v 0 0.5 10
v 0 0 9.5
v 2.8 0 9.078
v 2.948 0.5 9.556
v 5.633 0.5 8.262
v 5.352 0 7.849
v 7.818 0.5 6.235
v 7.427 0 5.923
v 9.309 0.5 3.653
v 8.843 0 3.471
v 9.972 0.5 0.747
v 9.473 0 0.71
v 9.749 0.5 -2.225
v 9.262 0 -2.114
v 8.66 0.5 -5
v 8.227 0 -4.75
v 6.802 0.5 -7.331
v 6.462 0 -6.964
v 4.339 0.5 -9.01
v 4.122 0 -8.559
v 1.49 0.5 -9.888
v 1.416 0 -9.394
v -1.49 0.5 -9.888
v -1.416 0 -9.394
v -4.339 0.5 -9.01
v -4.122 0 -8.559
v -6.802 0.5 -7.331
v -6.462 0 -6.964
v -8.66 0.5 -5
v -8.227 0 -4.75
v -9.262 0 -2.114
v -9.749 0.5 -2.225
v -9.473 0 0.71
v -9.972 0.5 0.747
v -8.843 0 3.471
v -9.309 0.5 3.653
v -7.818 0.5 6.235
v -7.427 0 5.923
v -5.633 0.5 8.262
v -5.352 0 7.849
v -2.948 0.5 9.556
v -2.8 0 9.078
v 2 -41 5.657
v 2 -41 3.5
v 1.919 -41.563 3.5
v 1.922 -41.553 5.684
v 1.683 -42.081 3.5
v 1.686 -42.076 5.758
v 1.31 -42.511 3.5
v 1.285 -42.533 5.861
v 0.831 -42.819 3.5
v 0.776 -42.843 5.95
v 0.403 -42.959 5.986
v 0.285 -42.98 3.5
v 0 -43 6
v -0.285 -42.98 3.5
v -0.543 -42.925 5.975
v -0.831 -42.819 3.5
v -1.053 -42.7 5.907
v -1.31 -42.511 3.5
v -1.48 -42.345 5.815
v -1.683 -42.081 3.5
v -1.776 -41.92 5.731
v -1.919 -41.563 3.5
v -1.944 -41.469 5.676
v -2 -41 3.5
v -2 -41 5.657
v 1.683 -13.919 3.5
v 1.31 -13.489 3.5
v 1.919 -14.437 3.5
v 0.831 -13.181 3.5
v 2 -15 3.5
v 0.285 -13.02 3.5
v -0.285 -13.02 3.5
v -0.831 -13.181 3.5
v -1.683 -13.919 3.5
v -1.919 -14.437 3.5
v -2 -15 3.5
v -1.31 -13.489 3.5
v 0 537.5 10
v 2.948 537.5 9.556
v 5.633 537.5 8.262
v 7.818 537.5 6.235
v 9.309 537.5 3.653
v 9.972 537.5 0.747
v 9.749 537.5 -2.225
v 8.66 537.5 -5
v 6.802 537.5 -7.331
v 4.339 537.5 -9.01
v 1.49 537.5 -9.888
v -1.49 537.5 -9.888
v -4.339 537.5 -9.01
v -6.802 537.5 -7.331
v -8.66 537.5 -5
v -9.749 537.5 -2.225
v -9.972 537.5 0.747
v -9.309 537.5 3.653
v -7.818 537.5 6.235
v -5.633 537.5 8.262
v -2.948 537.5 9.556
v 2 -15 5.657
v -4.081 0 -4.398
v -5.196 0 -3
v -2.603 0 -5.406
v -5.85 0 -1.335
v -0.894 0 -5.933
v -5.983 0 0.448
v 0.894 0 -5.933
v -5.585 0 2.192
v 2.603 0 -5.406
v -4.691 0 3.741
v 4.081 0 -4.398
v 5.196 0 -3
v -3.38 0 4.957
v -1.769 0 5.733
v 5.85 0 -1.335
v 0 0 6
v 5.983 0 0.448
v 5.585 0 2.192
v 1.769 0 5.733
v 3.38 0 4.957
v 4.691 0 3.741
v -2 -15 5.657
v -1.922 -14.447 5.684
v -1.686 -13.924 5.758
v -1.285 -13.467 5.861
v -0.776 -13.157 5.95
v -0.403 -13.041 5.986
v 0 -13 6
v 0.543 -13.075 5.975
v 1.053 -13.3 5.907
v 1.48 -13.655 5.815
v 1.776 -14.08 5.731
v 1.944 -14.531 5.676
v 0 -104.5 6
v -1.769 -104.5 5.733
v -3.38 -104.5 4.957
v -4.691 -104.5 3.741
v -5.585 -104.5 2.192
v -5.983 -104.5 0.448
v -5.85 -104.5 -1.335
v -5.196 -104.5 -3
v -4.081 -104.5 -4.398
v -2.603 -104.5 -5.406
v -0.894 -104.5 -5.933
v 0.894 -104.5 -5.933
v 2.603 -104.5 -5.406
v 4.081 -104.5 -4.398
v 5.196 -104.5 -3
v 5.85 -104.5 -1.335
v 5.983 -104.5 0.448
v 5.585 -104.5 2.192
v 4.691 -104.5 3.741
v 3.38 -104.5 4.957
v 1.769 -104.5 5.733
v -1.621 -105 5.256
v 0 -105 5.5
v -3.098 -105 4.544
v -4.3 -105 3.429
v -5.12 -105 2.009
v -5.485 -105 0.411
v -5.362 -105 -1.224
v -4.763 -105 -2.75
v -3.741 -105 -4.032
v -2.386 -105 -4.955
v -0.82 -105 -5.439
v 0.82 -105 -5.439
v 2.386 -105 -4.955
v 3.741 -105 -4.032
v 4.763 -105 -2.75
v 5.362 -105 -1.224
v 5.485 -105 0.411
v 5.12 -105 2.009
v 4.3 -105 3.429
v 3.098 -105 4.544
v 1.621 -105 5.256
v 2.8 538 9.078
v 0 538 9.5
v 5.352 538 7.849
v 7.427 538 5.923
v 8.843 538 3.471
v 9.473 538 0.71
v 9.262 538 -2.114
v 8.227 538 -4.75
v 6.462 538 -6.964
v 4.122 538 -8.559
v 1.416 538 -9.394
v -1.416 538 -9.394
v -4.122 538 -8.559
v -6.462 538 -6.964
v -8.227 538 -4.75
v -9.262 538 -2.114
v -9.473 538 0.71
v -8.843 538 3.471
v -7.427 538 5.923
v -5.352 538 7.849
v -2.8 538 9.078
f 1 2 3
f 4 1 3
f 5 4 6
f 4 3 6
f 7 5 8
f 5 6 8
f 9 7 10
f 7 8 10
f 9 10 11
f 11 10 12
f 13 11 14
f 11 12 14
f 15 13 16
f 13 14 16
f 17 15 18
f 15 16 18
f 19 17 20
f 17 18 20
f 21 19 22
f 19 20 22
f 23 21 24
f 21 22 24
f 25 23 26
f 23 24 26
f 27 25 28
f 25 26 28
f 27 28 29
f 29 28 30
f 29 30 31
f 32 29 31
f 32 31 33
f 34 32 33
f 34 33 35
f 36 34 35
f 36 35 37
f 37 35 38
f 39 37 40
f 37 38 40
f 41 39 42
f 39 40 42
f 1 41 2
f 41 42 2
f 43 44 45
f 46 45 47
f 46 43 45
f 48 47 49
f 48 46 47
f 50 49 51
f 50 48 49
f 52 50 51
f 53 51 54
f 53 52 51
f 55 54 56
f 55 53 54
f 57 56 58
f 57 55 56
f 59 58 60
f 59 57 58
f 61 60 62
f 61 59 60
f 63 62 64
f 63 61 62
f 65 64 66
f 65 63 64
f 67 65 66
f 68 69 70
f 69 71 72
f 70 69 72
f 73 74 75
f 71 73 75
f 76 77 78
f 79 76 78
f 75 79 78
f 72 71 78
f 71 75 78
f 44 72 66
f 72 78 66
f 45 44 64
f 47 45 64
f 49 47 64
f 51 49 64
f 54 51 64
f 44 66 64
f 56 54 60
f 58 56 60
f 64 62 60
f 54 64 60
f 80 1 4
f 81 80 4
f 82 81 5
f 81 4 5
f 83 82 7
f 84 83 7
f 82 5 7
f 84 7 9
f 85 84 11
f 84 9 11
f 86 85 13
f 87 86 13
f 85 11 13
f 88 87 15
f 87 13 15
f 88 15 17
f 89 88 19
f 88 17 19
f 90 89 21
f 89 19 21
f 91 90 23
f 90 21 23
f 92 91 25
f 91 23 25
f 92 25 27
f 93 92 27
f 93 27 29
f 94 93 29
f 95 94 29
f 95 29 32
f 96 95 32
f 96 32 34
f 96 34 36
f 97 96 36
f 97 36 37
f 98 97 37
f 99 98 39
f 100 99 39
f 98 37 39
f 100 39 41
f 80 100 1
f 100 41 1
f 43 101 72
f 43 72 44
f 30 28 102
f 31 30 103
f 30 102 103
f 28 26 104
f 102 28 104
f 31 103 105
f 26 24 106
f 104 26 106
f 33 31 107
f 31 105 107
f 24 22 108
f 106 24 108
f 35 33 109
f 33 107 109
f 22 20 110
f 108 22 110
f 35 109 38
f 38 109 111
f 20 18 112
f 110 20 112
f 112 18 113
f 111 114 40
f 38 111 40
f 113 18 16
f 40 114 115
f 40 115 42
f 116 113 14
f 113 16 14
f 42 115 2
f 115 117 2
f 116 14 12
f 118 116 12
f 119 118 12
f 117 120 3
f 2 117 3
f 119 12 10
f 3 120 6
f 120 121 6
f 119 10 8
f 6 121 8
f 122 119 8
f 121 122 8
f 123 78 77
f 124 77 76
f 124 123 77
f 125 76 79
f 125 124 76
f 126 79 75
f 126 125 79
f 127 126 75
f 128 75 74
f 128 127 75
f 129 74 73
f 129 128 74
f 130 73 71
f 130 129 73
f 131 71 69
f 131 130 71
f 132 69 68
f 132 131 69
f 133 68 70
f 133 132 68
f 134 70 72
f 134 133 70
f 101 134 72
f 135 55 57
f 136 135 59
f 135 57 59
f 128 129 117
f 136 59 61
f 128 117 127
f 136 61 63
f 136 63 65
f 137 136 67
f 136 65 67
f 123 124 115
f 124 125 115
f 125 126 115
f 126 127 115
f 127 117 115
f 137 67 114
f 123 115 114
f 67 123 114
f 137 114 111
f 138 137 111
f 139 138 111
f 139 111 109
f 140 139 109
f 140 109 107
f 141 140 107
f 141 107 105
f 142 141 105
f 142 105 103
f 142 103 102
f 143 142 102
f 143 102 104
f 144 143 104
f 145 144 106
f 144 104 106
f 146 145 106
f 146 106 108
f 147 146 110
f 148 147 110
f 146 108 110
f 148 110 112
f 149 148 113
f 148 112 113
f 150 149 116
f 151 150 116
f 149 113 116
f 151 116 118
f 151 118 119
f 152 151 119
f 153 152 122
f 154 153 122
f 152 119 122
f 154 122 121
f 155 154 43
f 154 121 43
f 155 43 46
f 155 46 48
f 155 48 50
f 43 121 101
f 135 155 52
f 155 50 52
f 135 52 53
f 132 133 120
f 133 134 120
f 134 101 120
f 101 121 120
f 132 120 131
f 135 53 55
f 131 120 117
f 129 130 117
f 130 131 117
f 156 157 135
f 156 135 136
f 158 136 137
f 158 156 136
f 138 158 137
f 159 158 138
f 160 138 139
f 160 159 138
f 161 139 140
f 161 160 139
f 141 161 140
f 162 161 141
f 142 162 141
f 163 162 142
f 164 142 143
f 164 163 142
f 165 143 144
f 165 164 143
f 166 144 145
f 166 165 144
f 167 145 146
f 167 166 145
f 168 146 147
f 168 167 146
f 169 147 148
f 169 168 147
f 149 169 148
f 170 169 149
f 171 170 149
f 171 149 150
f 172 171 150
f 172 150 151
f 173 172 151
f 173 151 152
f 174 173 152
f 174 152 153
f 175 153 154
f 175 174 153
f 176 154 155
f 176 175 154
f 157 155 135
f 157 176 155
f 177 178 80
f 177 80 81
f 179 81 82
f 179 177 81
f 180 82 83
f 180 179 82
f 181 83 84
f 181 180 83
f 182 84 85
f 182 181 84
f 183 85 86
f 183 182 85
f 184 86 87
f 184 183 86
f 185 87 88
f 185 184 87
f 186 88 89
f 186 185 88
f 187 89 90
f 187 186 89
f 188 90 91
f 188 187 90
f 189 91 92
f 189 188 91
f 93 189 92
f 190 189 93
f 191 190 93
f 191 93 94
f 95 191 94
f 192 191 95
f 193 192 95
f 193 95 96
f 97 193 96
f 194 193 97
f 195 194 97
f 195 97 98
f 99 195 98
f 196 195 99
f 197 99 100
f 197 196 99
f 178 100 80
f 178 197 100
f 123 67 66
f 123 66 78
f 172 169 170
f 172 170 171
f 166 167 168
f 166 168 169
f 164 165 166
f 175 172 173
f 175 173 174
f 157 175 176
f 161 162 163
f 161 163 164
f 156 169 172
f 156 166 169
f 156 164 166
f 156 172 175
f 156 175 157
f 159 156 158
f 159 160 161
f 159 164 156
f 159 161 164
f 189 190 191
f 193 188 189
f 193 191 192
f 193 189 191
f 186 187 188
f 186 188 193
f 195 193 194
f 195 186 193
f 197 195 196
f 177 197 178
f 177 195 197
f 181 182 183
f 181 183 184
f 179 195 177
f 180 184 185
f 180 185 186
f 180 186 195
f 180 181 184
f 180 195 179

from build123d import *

# Parameters (mm, degrees)
SKIZZE1_R                       = 10
AUFSATZ_LINEAR_AUSTRAGEN1_DEPTH = 538
SKIZZE2_R                       = 6
AUFSATZ_LINEAR_AUSTRAGEN2_DEPTH = 105
FASE1_SIZE                      = 0.5
CUT_EXTRUDE1_DEPTH              = 2.5


with BuildPart() as part:
    # Skizze1 → Aufsatz-Linear austragen1 (new body)
    with BuildSketch(Plane(origin=(0, 0, 0), x_dir=(1, 0, 0), z_dir=(0, 1, 0))):
        with Locations(Location((0, 0, 0), (0, 0, 270))):  # turned: the seam where the file's is
            Circle(SKIZZE1_R)
    extrude(amount=AUFSATZ_LINEAR_AUSTRAGEN1_DEPTH)

    # Skizze2 → Aufsatz-Linear austragen2 (add)
    with BuildSketch(Plane.XZ):
        with Locations(Location((0, 0, 0), (0, 0, 90))):  # turned: the seam where the file's is
            Circle(SKIZZE2_R)
    extrude(amount=AUFSATZ_LINEAR_AUSTRAGEN2_DEPTH)

    # Fase1
    fase1_edges = [part.edges().sort_by_distance(p)[0] for p in [
        (0, 0, -10),
        (0, 538, -10),
        (0, -105, -6),
    ]]
    chamfer(fase1_edges, length=FASE1_SIZE)

    # Sketch3 → Cut-Extrude1 (cut)
    with BuildSketch(Plane(origin=(1.706808785, -105, 6), x_dir=(0, -1, 0), z_dir=(0, 0, -1))):
        with BuildLine():
            Line((-64, 3.706808785), (-90, 3.706808785))
            ThreePointArc((-90, 3.706808785), (-92, 1.706808785), (-90, -0.293191215))
            Line((-90, -0.293191215), (-64, -0.293191215))
            ThreePointArc((-64, -0.293191215), (-62, 1.706808785), (-64, 3.706808785))
        make_face()
    extrude(amount=CUT_EXTRUDE1_DEPTH, mode=Mode.SUBTRACT)


solid = part.part
